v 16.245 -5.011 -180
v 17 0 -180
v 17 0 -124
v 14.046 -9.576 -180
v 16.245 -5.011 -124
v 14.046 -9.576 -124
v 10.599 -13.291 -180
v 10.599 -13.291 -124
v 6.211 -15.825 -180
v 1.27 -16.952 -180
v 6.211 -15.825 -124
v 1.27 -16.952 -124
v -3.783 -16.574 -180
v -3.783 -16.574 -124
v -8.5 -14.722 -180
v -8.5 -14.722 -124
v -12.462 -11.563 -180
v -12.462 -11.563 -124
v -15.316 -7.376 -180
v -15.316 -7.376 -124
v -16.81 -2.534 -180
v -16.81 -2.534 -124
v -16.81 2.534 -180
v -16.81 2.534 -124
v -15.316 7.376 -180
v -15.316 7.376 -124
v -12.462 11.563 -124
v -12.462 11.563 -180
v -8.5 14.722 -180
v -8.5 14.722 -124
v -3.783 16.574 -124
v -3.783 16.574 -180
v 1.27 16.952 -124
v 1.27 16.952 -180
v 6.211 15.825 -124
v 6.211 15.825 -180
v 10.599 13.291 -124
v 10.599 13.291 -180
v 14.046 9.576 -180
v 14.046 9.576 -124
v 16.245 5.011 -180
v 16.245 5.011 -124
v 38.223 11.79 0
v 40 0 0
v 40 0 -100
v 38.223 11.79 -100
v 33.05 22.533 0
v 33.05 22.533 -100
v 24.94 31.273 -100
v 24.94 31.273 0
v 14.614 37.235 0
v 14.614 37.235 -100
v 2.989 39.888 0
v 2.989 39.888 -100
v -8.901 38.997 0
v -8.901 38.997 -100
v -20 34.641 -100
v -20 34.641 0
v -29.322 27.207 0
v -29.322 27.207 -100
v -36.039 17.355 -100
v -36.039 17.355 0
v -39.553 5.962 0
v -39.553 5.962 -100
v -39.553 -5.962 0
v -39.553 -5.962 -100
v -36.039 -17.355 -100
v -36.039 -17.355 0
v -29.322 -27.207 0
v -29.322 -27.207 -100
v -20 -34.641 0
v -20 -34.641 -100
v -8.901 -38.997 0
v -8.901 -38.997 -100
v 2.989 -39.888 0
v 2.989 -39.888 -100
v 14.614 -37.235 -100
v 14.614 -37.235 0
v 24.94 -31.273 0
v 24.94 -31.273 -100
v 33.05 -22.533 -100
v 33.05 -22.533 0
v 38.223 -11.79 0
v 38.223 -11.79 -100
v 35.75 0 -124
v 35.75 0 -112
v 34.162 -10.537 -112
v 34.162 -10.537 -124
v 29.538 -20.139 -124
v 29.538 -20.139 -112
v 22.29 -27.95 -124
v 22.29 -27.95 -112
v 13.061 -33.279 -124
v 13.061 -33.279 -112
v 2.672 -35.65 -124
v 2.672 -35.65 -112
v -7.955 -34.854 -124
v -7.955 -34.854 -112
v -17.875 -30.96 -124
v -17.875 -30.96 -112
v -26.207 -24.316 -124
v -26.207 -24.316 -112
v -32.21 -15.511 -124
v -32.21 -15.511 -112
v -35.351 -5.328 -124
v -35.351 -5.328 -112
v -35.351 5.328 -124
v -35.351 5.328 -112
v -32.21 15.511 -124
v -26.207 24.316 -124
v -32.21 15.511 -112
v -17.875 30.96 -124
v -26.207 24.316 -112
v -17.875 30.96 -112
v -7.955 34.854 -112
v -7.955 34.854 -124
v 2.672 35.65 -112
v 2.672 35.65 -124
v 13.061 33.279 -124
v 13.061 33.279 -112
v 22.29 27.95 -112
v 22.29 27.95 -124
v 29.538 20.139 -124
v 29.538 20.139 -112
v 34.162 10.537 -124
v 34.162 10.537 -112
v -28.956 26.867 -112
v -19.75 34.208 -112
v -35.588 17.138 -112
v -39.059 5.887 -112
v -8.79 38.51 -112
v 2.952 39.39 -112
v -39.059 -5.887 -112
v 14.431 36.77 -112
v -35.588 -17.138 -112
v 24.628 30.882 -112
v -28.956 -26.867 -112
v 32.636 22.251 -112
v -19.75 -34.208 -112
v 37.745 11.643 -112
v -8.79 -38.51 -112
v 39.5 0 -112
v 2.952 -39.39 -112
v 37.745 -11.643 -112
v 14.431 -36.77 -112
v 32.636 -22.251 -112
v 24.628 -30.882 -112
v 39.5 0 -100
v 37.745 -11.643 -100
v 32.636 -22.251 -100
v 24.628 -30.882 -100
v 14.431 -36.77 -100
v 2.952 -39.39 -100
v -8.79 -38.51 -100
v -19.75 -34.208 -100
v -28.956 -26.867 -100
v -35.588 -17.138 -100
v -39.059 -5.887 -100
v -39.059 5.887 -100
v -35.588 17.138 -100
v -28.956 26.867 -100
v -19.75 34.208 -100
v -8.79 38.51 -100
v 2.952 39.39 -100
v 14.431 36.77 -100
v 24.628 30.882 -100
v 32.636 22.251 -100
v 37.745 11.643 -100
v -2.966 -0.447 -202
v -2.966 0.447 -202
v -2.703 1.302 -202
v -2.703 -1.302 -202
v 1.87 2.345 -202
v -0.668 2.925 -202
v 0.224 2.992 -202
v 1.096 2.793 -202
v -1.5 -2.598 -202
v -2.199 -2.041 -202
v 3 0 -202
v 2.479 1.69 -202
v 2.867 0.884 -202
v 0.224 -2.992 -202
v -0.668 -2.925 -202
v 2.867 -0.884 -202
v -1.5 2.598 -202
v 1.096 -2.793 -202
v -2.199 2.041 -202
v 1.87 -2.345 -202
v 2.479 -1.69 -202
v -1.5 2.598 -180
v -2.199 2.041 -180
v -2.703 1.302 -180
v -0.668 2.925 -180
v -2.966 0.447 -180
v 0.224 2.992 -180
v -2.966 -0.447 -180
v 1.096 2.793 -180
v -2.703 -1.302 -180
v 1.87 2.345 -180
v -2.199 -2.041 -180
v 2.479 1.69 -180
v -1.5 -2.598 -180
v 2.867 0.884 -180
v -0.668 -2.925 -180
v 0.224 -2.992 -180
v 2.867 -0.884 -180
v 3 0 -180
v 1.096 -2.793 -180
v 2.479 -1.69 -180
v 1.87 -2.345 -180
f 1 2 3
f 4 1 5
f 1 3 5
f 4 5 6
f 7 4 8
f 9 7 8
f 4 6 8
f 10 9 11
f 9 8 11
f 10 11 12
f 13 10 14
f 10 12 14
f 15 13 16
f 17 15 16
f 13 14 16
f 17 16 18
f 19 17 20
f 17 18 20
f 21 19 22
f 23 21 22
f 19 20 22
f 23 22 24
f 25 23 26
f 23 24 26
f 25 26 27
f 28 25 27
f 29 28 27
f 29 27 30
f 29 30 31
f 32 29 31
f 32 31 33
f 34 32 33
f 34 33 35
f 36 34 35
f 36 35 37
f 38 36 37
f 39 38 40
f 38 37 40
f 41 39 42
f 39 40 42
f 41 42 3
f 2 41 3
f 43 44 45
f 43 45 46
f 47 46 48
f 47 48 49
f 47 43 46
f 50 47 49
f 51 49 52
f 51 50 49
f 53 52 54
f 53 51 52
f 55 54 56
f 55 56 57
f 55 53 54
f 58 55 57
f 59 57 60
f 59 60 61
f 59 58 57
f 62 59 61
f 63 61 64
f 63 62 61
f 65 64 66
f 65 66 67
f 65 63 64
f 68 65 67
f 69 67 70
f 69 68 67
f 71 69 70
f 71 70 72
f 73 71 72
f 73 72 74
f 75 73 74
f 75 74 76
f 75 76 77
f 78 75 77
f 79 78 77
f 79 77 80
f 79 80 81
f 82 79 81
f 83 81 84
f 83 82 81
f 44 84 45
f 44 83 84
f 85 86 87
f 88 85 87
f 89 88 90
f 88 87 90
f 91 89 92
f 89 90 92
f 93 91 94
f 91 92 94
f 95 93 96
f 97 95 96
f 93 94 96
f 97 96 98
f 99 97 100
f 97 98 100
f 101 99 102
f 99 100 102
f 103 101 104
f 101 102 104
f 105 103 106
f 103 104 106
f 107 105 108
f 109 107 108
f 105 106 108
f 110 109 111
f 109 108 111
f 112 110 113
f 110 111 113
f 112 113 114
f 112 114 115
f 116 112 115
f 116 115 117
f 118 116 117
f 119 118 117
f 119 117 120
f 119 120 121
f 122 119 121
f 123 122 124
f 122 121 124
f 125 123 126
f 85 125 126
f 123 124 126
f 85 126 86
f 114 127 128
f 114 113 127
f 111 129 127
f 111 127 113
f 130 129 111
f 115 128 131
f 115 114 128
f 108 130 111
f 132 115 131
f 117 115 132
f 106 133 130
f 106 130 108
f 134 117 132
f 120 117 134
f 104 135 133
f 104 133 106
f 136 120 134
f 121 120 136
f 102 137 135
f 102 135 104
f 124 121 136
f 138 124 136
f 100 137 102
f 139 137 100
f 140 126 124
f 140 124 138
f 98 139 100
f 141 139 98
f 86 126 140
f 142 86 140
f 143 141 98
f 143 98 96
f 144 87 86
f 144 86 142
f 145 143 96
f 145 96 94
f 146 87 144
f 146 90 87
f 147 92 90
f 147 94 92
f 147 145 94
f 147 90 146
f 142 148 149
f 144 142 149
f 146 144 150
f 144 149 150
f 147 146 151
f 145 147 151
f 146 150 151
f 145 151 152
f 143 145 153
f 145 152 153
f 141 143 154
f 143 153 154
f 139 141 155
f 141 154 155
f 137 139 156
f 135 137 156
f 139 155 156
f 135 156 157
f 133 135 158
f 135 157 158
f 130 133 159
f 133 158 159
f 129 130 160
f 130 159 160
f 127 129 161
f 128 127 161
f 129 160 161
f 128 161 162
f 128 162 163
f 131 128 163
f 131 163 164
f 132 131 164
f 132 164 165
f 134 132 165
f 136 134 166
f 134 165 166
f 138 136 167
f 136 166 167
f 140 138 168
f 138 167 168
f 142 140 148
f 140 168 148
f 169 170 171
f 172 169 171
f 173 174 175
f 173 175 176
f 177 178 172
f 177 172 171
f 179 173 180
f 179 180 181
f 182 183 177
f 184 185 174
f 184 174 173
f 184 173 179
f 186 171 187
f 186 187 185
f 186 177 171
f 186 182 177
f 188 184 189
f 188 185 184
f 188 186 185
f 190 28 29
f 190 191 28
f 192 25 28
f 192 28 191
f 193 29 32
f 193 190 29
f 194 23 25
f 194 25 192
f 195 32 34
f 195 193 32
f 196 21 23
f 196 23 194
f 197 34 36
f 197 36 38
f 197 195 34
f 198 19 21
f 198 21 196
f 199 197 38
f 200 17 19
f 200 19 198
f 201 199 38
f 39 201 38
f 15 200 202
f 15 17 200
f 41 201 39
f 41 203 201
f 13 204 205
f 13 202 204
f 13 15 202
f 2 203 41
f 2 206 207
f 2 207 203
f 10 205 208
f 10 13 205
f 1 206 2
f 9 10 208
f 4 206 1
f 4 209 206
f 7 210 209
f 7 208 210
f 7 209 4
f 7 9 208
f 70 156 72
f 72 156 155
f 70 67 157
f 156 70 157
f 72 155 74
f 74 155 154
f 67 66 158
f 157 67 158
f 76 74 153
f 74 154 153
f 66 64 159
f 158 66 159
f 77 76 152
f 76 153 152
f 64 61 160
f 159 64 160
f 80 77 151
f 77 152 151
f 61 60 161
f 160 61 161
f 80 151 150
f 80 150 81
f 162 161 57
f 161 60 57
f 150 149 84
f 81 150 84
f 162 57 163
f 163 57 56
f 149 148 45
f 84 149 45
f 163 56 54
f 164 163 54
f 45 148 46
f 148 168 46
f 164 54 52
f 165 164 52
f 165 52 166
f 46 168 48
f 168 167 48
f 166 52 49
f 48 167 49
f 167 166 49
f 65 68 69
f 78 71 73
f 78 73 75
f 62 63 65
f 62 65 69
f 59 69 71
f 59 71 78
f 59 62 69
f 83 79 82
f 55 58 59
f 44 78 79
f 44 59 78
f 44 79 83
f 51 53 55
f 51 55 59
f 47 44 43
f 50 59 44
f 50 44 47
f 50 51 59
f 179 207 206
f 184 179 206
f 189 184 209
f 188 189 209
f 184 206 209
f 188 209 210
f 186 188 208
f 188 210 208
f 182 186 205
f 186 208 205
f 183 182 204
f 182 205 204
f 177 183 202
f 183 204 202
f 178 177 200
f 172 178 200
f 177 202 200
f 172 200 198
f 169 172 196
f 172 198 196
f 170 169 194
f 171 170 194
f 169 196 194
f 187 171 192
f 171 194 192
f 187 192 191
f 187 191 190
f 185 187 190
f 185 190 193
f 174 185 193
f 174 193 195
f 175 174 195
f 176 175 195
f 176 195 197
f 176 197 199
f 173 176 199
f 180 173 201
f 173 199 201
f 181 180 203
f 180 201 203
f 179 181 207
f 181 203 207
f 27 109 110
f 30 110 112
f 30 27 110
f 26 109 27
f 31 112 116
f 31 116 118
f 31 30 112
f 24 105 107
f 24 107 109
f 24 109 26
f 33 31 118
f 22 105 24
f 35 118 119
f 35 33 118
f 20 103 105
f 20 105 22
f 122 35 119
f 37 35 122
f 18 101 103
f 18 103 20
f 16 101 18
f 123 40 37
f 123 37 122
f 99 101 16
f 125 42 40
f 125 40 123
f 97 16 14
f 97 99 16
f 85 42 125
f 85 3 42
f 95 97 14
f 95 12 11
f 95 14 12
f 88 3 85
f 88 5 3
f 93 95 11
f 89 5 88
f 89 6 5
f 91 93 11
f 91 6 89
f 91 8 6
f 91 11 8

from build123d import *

# Parameters (mm, degrees)
SKETCH_R     = 40
PAD_DEPTH    = 100
SKETCH001_R  = 39.5
PAD001_DEPTH = 12
SKETCH002_R  = 35.75
PAD002_DEPTH = 12
SKETCH003_R  = 17
PAD003_DEPTH = 56
SKETCH004_R  = 3
PAD004_DEPTH = 22


with BuildPart() as part:
    # Sketch → Pad (new body)
    with BuildSketch(Plane.XY):
        Circle(SKETCH_R)
    extrude(amount=-PAD_DEPTH)

    # Sketch001 (on Face3 of Pad) → Pad001 (join)
    with BuildSketch(Plane(origin=(0, 0, -100), x_dir=(1, 0, 0), z_dir=(0, 0, -1))):
        Circle(SKETCH001_R)
    extrude(amount=PAD001_DEPTH)

    # Sketch002 (on Face5 of Pad001) → Pad002 (join)
    with BuildSketch(Plane(origin=(0, 0, -112), x_dir=(1, 0, 0), z_dir=(0, 0, -1))):
        Circle(SKETCH002_R)
    extrude(amount=PAD002_DEPTH)

    # Sketch003 (on Face7 of Pad002) → Pad003 (join)
    with BuildSketch(Plane(origin=(0, 0, -124), x_dir=(1, 0, 0), z_dir=(0, 0, -1))):
        Circle(SKETCH003_R)
    extrude(amount=PAD003_DEPTH)

    # Sketch004 (on Face9 of Pad003) → Pad004 (join)
    with BuildSketch(Plane(origin=(0, 0, -180), x_dir=(1, 0, 0), z_dir=(0, 0, -1))):
        Circle(SKETCH004_R)
    extrude(amount=PAD004_DEPTH)


solid = part.part
